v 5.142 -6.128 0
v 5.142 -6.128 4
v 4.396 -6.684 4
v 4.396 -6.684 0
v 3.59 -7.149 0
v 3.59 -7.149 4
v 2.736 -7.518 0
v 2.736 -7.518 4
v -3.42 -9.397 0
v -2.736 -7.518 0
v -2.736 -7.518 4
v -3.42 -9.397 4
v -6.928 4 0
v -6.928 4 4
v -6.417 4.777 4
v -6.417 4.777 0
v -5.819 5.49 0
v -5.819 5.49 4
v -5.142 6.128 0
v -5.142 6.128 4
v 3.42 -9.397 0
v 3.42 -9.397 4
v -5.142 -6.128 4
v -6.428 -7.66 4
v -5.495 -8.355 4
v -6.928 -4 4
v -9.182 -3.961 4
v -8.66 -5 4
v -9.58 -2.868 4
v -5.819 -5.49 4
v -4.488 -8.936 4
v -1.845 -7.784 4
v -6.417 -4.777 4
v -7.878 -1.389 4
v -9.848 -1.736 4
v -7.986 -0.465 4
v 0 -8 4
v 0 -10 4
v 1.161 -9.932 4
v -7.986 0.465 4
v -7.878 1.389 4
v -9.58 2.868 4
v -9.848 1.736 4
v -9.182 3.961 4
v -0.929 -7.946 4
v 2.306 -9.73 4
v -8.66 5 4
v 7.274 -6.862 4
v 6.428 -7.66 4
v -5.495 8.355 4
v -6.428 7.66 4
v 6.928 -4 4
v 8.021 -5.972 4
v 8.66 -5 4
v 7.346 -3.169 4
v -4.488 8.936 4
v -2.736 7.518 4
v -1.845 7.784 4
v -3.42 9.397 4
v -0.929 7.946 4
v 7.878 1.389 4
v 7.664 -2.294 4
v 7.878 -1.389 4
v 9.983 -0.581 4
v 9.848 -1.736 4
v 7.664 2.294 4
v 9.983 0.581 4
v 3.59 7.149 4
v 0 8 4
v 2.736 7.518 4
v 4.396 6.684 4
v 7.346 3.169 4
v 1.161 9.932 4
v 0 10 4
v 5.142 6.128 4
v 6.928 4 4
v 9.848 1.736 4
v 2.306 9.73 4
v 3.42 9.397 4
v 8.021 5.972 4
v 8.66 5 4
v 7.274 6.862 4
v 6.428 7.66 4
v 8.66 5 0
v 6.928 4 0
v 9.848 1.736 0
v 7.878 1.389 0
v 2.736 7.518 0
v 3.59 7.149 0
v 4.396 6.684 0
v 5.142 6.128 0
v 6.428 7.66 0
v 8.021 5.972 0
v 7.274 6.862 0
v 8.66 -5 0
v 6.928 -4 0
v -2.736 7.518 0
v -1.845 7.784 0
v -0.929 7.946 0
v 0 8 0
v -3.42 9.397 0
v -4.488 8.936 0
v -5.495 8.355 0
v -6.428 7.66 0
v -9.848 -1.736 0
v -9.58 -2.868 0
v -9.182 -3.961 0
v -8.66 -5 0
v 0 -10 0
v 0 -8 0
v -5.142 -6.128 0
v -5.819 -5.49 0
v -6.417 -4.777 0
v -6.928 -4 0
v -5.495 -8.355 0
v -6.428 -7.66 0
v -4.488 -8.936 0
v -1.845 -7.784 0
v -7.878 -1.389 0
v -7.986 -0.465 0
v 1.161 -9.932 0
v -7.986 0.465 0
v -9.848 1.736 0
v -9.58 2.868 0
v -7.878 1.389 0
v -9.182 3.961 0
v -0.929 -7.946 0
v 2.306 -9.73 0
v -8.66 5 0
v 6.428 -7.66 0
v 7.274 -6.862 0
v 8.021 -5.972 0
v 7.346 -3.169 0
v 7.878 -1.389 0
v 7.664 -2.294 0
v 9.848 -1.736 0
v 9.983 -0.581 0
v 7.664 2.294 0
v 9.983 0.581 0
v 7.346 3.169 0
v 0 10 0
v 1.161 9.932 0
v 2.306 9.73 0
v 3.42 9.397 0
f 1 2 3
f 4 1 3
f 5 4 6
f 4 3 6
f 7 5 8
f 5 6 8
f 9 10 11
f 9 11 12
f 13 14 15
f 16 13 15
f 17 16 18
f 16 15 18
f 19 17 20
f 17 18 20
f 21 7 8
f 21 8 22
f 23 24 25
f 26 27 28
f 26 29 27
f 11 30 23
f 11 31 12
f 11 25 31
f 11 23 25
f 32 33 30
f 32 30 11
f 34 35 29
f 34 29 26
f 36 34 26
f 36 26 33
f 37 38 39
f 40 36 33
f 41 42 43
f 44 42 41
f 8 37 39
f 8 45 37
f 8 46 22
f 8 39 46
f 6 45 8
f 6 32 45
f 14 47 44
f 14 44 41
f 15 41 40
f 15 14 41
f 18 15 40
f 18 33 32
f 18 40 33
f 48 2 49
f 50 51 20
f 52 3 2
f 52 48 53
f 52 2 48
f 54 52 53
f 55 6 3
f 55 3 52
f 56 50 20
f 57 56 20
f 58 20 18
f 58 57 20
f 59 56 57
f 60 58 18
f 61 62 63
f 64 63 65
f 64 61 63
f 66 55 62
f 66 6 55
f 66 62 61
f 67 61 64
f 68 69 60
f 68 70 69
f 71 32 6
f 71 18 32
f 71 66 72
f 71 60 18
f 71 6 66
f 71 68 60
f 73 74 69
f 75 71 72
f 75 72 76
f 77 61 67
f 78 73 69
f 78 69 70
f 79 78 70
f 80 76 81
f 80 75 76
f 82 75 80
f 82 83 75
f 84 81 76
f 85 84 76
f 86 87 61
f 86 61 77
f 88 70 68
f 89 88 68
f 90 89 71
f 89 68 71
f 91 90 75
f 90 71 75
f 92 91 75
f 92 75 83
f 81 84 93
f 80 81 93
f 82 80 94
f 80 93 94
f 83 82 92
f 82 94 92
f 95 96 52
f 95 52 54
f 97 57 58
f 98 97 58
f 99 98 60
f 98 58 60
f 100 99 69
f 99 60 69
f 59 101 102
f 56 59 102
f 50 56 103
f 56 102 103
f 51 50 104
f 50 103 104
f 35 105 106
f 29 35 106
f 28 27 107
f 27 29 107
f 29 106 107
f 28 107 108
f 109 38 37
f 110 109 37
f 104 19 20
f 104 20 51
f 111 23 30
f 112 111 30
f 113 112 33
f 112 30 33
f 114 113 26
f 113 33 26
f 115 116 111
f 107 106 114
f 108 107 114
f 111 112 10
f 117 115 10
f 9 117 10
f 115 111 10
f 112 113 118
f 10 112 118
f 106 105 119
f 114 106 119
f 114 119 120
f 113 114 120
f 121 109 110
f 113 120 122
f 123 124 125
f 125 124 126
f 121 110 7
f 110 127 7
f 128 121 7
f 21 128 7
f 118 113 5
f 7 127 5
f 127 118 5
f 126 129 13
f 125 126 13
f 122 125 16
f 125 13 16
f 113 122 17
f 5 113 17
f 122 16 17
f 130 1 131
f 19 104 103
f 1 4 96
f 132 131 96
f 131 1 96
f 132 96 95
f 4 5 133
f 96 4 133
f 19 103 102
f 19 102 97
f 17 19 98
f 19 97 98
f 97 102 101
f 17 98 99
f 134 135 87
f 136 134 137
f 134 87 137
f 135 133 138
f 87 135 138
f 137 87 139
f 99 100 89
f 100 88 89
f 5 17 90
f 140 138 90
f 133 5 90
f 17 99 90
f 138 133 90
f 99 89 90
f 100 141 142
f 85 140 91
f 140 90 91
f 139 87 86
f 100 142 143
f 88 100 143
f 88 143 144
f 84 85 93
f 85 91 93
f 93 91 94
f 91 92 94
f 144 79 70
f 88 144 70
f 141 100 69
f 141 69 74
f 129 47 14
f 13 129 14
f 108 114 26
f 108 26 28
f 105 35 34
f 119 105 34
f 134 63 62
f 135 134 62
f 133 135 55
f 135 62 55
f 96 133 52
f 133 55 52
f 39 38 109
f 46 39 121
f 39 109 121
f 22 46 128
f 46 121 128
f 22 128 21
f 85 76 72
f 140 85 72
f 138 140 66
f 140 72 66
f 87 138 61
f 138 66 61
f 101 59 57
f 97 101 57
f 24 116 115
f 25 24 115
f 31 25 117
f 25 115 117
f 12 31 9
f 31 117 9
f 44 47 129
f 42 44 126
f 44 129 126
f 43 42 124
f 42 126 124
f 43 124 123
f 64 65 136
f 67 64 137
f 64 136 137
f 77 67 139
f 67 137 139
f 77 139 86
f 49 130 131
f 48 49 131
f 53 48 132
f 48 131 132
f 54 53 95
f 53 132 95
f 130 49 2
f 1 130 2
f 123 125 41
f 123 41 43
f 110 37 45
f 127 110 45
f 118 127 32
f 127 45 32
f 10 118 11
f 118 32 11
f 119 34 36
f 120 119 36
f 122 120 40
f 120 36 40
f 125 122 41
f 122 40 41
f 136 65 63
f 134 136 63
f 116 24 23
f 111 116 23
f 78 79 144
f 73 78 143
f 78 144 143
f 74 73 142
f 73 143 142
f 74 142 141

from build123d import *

# Parameters (mm, degrees)
F0_R            = 10
F1_DEPTH        = 4
F3_DEPTH        = 4.001
F3_COPIES_COUNT = 9


# Not quite as in the source:
# - a pattern or mirror of a feature is missing from the dataset's text; its kind, count and spacing are read off the source's solid


with BuildPart() as f1:
    # F0 (on Top) → F1 (new body)
    with BuildSketch(Plane.XY):
        Circle(F0_R)
    extrude(amount=F1_DEPTH)

    # F2 (on face) → F3 (cut, through all)
    with BuildSketch(Plane.XY.offset(4)):
        with BuildLine():
            ThreePointArc((-2.7361611466, 7.5175409663), (-1.3891854213, 7.8784620241), (0, 8))
            Line((0, 8), (0, 10))
            ThreePointArc((0, 10), (-1.7364817767, 9.8480775301), (-3.4202014333, 9.3969262079))
            Line((-3.4202014333, 9.3969262079), (-2.7361611466, 7.5175409663))
        make_face()
    f3 = extrude(amount=-F3_DEPTH, mode=Mode.SUBTRACT)

    # F3_copies: F3 ×9 about axis
    f3_copies_axis = Axis((0, 0, 0), (0, 0, 1))
    for i in range(1, F3_COPIES_COUNT):
        add(f3.rotate(f3_copies_axis, i * 360 / F3_COPIES_COUNT), mode=Mode.SUBTRACT)


solid = f1.part
